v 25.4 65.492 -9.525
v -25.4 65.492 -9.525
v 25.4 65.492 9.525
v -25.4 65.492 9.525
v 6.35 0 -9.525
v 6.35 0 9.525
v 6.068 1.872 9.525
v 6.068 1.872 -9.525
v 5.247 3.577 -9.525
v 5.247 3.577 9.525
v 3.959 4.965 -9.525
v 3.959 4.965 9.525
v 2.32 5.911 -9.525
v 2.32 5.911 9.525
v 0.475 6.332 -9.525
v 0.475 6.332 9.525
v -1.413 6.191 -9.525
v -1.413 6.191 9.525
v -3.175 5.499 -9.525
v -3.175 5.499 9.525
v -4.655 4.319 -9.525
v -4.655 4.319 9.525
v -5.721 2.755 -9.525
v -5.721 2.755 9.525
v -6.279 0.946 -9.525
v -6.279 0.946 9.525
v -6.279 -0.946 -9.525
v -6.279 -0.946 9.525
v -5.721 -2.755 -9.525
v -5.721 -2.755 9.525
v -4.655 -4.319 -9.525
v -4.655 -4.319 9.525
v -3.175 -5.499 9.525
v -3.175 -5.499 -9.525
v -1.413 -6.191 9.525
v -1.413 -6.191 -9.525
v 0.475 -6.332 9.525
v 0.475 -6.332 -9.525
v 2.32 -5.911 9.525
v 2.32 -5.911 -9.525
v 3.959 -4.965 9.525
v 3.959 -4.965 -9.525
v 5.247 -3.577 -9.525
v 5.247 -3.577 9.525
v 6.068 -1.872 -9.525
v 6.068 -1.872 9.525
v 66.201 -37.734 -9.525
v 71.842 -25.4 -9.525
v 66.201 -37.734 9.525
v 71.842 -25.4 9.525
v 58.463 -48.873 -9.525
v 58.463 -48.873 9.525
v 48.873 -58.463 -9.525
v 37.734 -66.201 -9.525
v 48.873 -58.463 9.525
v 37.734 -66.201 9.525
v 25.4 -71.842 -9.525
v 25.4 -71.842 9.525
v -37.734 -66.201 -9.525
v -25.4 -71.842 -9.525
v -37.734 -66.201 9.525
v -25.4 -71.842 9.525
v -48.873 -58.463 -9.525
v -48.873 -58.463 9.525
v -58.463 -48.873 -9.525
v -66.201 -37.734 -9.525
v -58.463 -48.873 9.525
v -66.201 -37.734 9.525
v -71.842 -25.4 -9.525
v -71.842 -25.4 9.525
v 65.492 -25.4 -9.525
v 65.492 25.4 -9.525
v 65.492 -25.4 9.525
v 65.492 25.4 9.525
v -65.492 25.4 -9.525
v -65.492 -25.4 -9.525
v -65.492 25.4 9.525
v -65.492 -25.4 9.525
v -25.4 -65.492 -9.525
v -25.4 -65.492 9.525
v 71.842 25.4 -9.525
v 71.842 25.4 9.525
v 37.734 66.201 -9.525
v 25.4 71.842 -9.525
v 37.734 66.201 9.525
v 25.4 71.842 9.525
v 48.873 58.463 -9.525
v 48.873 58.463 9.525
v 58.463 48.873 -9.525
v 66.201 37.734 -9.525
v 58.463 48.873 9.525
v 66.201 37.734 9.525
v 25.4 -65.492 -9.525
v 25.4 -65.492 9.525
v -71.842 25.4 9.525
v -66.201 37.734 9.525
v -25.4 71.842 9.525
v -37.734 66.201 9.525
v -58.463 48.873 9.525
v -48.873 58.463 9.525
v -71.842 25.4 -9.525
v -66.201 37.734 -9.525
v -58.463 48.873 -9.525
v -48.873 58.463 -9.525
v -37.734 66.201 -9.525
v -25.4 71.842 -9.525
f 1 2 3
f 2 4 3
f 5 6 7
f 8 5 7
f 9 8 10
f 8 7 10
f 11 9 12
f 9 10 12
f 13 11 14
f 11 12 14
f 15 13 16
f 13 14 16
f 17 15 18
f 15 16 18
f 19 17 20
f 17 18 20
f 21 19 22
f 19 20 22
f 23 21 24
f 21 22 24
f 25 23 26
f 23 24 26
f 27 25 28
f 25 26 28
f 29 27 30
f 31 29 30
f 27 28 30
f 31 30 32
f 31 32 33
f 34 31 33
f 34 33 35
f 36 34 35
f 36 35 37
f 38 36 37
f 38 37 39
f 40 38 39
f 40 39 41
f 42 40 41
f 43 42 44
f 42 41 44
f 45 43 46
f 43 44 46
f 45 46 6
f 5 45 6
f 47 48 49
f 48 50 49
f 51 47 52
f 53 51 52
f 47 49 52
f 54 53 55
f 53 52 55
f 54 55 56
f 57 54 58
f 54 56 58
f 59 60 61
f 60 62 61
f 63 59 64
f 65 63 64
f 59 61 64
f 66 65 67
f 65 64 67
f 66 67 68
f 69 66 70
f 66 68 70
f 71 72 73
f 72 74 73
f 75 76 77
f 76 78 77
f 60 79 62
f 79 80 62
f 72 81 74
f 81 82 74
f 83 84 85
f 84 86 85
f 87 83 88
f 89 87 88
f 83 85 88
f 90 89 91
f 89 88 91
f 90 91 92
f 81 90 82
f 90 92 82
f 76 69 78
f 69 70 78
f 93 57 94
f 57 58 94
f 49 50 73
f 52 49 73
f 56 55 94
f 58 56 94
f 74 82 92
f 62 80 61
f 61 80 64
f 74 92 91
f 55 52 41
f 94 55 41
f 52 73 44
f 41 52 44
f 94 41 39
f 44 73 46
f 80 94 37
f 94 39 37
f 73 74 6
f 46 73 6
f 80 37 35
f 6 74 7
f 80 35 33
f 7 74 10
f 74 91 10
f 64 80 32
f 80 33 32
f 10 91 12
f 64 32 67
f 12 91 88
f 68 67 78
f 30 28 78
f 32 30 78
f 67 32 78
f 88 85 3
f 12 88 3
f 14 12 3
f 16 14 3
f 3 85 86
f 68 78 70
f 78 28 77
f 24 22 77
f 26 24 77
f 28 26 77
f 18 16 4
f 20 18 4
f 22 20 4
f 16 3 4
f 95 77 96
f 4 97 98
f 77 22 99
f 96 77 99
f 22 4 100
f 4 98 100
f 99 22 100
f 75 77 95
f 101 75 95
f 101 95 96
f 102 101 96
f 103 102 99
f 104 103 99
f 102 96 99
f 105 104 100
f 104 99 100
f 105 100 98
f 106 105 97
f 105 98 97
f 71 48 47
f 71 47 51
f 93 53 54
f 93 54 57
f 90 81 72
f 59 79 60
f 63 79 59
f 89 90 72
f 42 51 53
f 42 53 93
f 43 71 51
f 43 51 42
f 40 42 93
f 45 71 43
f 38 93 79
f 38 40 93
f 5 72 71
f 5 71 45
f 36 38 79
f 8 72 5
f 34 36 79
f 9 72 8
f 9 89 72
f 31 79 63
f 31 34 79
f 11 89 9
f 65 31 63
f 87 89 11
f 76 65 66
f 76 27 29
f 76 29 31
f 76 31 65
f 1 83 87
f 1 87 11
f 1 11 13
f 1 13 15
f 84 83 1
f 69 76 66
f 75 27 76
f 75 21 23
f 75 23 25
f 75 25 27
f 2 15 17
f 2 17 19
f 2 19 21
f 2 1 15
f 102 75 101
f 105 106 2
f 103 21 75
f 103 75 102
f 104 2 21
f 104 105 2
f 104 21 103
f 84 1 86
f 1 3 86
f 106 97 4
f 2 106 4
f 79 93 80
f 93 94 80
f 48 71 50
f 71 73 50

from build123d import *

# Parameters (mm, degrees)
BOSS_EXTRUDE2_DEPTH = 9.525
SKETCH3_R           = 6.35
CUT_EXTRUDE2_DEPTH  = 19.05


with BuildPart() as part:
    # Sketch1 → Boss-Extrude2 (new, symmetric)
    with BuildSketch(Plane.XY):
        with BuildLine():
            Line((-25.4, 71.842048969), (-25.4, 65.492048969))
            Line((-25.4, 65.492048969), (25.4, 65.492048969))
            Line((25.4, 65.492048969), (25.4, 71.842048969))
            ThreePointArc((25.4, 71.842048969), (53.881536726, 53.881536726), (71.842048969, 25.4))
            Line((71.842048969, 25.4), (65.492048969, 25.4))
            Line((65.492048969, 25.4), (65.492048969, -25.4))
            Line((65.492048969, -25.4), (71.842048969, -25.4))
            ThreePointArc((71.842048969, -25.4), (53.881536726, -53.881536726), (25.4, -71.842048969))
            Line((25.4, -71.842048969), (25.4, -65.492048969))
            Line((25.4, -65.492048969), (-25.4, -65.492048969))
            Line((-25.4, -65.492048969), (-25.4, -71.842048969))
            ThreePointArc((-25.4, -71.842048969), (-53.881536726, -53.881536726), (-71.842048969, -25.4))
            Line((-71.842048969, -25.4), (-65.492048969, -25.4))
            Line((-65.492048969, -25.4), (-65.492048969, 25.4))
            Line((-65.492048969, 25.4), (-71.842048969, 25.4))
            ThreePointArc((-71.842048969, 25.4), (-53.881536726, 53.881536726), (-25.4, 71.842048969))
        make_face()
    extrude(amount=BOSS_EXTRUDE2_DEPTH, both=True)

    # Sketch3 → Cut-Extrude2 (cut)
    with BuildSketch(Plane.XY.offset(9.525)):
        Circle(SKETCH3_R)
    extrude(amount=-CUT_EXTRUDE2_DEPTH, mode=Mode.SUBTRACT)


solid = part.part
